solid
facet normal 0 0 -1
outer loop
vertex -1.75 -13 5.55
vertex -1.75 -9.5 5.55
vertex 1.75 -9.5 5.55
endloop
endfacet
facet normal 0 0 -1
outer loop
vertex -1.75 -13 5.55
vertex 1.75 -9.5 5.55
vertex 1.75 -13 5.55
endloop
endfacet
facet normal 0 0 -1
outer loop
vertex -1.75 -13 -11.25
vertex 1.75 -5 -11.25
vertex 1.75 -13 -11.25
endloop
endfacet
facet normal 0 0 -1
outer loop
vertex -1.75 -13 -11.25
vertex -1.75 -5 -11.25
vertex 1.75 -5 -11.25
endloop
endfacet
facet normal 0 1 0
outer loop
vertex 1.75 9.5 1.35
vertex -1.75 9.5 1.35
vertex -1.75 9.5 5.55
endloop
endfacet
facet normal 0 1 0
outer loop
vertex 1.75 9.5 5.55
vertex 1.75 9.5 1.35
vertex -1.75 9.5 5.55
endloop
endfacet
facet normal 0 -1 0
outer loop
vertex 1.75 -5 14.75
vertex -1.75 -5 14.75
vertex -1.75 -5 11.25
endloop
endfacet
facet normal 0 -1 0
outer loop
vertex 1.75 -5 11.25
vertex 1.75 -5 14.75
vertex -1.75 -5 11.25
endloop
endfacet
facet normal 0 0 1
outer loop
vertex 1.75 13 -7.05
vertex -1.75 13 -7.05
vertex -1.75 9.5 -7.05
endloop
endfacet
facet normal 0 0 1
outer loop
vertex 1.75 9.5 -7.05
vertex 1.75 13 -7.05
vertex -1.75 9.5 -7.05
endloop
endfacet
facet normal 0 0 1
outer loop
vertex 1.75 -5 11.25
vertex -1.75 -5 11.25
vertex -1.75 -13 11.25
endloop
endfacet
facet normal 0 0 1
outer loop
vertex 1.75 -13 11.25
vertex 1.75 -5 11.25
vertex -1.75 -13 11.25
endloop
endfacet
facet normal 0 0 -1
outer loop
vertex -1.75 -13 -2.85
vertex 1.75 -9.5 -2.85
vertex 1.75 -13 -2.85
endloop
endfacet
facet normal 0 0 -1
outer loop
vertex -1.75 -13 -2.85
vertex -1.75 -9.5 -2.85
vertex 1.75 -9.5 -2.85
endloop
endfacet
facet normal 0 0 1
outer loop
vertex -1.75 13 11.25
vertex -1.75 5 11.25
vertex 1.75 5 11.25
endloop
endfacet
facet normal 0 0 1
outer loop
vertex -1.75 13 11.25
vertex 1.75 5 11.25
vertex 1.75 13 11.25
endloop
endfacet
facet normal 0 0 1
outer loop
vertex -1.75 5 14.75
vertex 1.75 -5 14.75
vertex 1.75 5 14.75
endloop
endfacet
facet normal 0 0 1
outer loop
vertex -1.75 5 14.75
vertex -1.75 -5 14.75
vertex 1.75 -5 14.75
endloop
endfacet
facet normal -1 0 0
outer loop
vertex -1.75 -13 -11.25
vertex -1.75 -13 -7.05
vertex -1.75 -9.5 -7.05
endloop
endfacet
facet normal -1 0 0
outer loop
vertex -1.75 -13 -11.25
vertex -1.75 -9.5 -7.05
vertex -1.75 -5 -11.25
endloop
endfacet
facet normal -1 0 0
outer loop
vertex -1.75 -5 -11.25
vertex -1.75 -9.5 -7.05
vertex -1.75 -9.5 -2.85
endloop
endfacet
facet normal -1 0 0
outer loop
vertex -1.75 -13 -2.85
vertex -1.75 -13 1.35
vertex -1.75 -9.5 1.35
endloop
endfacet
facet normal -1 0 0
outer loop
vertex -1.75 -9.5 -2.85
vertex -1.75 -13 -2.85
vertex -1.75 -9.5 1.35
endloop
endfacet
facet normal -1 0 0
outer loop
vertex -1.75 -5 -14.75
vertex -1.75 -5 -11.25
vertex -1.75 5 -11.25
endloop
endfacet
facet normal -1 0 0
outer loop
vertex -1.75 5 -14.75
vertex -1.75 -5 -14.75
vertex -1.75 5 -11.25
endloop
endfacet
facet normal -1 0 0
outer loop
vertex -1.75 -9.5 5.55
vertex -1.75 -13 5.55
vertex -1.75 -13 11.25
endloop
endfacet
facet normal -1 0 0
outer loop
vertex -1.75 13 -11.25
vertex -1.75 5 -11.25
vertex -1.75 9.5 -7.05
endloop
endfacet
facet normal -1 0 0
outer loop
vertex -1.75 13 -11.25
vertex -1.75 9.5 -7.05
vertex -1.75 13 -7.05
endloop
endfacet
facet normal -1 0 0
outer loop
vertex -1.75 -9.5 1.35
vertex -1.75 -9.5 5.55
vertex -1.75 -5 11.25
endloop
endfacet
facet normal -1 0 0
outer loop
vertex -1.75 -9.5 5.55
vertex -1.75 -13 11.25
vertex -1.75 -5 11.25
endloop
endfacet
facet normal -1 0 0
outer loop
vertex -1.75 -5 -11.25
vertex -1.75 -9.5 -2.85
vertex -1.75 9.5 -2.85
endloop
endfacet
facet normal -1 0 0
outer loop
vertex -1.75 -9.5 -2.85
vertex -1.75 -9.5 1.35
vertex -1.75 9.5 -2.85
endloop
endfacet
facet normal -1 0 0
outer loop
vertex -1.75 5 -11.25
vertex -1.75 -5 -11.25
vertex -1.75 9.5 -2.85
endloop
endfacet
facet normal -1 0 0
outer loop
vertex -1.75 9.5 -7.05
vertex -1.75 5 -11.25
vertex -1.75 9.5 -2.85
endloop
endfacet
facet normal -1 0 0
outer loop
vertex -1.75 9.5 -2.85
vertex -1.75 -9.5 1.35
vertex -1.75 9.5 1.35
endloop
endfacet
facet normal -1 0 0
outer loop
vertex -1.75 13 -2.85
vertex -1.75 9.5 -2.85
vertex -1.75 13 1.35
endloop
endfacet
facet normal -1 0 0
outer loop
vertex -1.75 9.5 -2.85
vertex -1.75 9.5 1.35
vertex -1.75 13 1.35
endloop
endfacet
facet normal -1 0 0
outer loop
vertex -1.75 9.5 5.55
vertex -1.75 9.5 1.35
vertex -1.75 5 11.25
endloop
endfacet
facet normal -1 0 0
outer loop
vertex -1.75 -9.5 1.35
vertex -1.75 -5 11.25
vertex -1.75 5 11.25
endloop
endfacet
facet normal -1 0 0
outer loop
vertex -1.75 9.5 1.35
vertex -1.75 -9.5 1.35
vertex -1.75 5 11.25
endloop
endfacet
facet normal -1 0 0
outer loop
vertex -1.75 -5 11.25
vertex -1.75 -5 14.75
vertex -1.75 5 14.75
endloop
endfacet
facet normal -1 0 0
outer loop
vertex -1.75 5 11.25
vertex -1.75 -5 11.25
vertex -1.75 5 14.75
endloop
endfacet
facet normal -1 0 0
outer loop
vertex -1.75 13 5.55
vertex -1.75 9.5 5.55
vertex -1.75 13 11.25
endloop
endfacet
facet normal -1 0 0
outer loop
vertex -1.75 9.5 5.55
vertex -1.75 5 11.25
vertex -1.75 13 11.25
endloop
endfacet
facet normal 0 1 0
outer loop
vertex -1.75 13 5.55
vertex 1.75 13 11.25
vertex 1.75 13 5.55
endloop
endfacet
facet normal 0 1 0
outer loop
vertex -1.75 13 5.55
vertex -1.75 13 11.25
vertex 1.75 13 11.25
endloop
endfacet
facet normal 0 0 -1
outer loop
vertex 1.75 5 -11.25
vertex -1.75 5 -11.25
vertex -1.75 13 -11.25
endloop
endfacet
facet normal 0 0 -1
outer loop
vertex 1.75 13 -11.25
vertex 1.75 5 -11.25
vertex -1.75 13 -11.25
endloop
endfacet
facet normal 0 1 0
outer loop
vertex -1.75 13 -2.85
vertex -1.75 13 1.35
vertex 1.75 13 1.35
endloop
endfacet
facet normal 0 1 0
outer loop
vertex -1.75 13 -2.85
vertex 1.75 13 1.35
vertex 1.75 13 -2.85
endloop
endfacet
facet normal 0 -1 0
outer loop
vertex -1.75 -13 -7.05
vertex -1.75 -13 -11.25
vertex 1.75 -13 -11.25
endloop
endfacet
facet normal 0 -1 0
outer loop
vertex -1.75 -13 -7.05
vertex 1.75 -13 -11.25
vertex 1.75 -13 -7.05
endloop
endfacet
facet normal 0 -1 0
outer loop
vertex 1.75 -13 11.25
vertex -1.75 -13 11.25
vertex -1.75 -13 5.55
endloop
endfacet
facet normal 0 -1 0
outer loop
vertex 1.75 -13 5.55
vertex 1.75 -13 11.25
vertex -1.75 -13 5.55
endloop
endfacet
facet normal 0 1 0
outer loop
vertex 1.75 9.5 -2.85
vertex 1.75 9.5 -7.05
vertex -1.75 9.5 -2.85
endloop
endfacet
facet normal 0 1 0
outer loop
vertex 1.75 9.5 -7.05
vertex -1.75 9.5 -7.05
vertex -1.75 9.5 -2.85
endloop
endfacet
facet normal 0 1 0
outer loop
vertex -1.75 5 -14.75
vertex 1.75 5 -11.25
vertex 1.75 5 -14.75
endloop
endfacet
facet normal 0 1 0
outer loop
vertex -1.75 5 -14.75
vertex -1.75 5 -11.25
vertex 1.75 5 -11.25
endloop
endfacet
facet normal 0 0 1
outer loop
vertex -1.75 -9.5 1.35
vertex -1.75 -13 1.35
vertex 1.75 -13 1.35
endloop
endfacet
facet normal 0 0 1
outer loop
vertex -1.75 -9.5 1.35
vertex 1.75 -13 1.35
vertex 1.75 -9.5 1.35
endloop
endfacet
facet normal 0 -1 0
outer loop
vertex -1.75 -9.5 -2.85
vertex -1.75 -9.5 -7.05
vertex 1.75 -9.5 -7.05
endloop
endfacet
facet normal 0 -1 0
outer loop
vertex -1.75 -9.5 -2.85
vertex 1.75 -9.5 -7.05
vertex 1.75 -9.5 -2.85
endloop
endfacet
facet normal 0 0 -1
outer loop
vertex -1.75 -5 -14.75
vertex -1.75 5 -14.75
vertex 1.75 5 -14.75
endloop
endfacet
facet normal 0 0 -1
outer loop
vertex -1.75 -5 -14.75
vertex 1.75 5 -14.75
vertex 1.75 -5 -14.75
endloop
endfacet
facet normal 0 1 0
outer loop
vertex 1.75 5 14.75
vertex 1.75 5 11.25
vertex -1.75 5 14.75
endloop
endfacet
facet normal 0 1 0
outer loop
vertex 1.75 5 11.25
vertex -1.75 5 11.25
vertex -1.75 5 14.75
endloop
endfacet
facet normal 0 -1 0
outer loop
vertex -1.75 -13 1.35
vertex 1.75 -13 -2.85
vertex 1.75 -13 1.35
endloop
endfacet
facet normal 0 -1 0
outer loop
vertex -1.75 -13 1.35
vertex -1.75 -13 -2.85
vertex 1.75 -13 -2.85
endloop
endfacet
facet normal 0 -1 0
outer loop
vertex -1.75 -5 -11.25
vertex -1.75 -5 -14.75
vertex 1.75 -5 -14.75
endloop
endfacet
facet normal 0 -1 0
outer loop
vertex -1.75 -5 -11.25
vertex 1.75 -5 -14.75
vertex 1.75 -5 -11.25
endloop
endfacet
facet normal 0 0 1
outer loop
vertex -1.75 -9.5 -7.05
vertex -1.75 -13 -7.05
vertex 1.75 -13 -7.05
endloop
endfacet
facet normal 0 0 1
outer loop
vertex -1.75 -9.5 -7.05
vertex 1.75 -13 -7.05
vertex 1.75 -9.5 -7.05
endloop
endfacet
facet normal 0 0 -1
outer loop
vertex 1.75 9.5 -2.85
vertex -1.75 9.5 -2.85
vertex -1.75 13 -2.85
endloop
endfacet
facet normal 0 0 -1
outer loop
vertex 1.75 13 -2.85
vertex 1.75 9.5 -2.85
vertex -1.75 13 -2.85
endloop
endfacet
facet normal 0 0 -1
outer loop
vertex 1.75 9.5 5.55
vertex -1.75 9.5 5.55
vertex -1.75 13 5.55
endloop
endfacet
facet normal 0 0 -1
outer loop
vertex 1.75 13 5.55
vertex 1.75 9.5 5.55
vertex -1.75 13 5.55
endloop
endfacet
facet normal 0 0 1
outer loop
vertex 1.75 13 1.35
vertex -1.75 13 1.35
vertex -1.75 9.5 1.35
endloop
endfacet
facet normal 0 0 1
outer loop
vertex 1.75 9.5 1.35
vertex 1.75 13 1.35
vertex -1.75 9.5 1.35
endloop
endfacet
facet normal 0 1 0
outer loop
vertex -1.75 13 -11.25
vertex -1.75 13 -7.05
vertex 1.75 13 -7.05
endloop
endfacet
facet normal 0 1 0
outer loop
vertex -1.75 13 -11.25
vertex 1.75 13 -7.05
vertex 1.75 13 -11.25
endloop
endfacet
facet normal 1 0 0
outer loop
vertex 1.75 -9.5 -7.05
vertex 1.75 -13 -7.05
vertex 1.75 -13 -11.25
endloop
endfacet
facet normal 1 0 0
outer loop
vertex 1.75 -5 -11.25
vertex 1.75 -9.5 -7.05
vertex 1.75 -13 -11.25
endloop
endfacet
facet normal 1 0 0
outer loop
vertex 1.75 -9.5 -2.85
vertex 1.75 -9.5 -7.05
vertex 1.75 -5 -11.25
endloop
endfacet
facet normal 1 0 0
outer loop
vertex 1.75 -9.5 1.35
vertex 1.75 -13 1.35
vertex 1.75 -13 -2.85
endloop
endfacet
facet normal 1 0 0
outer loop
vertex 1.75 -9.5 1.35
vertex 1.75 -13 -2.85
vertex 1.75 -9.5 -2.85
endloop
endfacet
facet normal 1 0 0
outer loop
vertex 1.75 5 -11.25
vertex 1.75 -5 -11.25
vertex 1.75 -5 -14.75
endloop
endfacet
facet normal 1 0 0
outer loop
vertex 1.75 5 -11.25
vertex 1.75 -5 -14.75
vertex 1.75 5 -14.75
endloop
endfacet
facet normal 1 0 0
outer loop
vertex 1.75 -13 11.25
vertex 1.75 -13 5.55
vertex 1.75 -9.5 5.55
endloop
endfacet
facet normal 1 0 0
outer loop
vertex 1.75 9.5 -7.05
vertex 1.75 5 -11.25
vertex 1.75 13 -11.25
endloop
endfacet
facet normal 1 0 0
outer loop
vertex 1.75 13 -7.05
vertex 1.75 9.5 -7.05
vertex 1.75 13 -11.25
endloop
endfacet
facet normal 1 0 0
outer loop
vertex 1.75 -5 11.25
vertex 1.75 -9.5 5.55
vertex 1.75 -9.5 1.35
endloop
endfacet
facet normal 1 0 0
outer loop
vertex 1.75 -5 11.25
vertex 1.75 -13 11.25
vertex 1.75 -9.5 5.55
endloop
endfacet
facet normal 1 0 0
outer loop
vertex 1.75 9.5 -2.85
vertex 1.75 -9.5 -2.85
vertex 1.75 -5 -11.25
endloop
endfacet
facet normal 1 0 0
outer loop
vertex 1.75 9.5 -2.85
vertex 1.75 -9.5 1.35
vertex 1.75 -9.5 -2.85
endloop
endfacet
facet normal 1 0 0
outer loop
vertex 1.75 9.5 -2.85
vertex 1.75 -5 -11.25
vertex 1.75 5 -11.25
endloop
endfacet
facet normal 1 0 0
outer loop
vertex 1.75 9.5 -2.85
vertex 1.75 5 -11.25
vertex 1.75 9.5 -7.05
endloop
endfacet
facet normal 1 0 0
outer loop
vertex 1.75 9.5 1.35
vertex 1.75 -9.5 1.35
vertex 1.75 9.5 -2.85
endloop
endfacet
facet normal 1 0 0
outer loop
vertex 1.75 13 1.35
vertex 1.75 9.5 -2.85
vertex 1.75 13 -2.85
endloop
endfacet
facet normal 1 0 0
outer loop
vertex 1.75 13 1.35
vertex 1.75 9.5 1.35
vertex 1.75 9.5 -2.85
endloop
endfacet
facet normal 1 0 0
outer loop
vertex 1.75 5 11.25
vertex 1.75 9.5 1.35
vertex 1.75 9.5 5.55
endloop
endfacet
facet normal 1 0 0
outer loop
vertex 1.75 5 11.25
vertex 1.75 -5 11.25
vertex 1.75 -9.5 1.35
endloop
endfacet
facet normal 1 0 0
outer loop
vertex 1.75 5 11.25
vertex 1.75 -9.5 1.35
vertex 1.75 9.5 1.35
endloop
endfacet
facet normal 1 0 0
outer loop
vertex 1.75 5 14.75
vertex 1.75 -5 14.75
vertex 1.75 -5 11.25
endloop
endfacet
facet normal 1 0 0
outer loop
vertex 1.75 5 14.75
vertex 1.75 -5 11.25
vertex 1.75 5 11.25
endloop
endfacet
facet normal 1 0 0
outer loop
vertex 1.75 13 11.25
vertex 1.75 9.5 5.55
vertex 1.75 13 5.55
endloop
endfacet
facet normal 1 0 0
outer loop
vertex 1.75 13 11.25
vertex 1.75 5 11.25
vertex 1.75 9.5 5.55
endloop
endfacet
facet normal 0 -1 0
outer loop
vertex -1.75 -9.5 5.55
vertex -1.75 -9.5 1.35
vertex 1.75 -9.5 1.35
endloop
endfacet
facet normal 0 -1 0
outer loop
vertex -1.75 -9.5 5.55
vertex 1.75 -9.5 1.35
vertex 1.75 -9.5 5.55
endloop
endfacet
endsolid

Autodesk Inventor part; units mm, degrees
ref_plane "YZ Plane" through (0, 0, 0) normal (1, 0, 0) x (0, 1, 0)
ref_plane "XZ Plane" through (0, 0, 0) normal (0, 1, 0) x (-1, 0, 0)
ref_plane "XY Plane" through (0, 0, 0) normal (0, 0, 1) x (1, 0, 0)
sketch "Sketch1" plane through (0, 0, 0) normal (1, 0, 0) x (0, 1, 0)
  line L0 (13, -14.75) -> (-13, -14.75)
  line L1 (-13, -14.75) -> (-13, 14.75) construction
  line L2 (-13, 14.75) -> (13, 14.75)
  line L3 (13, 14.75) -> (13, -14.75)
  line L4 (5, -14.75) -> (-5, -14.75)
  line L5 (-5, -14.75) -> (-5, -11.25)
  line L6 (-5, -11.25) -> (5, -11.25)
  line L7 (5, -11.25) -> (5, -14.75)
  line L8 (-5, -11.25) -> (-13, -11.25)
  line L9 (-13, -11.25) -> (-13, -7.05)
  line L10 (-13, -7.05) -> (-9.5, -7.05)
  line L11 (-9.5, -7.05) -> (-9.5, -2.85)
  line L12 (-9.5, -2.85) -> (-13, -2.85)
  line L13 (-13, -2.85) -> (-13, 1.35)
  line L14 (-13, 1.35) -> (-9.5, 1.35)
  line L15 (-9.5, 1.35) -> (-9.5, 5.55)
  line L16 (-9.5, 5.55) -> (-13, 5.55)
  line L17 (5, 14.75) -> (-5, 14.75)
  line L18 (-5, 14.75) -> (-5, 11.25)
  line L19 (-5, 11.25) -> (5, 11.25)
  line L20 (5, 11.25) -> (5, 14.75)
  line L21 (-5, 11.25) -> (-13, 11.25)
  line L22 (0, 0) -> (0, -1.9359)
  line L23 (5, -11.25) -> (13, -11.25)
  line L24 (13, -7.05) -> (9.5, -7.05)
  line L25 (9.5, -7.05) -> (9.5, -2.85)
  line L26 (9.5, -2.85) -> (13, -2.85)
  line L27 (13, 1.35) -> (9.5, 1.35)
  line L28 (9.5, 1.35) -> (9.5, 5.55)
  line L29 (9.5, 5.55) -> (13, 5.55)
  line L30 (5, 11.25) -> (13, 11.25)
  line L31 (-13, 11.25) -> (-13, 5.55)
  line L32 (-13, 1.35) -> (-13, -2.85)
  line L33 (-13, -7.05) -> (-13, -11.25)
  point P0 (0, -14.75)
  point P1 (-13, 0)
  point P2 (0, -11.25)
  point P3 (-5, -14.75)
  dimension "d0" = 26
  dimension "d1" = 29.5
  dimension "d2" = 10
  dimension "d3" = 3.5
  dimension "d4" = 4.2
  dimension "d5" = 3.5
  dimension "d6" = 4.2
  dimension "d7" = 4.2
  dimension "d8" = 4.2
  dimension "d9" = 3.5
extrude "Extrusion1" add sketch "Sketch1" along normal mid plane 3.5 contours L0 L5 L6 L7 | L23 L6 L8 L9 L10 L11 L12 L13 L14 L15 L16 L31 L21 L19 L30 L3 L29 L28 L27 L26 L25 L24 | L19 L18 L2 L20
sketch "Sketch2" plane through (1.75, 0, 0) normal (1, 0, 0) x (0, 0, -1)
  point P0 (0, 0)
properties part number "Stran Stran"
